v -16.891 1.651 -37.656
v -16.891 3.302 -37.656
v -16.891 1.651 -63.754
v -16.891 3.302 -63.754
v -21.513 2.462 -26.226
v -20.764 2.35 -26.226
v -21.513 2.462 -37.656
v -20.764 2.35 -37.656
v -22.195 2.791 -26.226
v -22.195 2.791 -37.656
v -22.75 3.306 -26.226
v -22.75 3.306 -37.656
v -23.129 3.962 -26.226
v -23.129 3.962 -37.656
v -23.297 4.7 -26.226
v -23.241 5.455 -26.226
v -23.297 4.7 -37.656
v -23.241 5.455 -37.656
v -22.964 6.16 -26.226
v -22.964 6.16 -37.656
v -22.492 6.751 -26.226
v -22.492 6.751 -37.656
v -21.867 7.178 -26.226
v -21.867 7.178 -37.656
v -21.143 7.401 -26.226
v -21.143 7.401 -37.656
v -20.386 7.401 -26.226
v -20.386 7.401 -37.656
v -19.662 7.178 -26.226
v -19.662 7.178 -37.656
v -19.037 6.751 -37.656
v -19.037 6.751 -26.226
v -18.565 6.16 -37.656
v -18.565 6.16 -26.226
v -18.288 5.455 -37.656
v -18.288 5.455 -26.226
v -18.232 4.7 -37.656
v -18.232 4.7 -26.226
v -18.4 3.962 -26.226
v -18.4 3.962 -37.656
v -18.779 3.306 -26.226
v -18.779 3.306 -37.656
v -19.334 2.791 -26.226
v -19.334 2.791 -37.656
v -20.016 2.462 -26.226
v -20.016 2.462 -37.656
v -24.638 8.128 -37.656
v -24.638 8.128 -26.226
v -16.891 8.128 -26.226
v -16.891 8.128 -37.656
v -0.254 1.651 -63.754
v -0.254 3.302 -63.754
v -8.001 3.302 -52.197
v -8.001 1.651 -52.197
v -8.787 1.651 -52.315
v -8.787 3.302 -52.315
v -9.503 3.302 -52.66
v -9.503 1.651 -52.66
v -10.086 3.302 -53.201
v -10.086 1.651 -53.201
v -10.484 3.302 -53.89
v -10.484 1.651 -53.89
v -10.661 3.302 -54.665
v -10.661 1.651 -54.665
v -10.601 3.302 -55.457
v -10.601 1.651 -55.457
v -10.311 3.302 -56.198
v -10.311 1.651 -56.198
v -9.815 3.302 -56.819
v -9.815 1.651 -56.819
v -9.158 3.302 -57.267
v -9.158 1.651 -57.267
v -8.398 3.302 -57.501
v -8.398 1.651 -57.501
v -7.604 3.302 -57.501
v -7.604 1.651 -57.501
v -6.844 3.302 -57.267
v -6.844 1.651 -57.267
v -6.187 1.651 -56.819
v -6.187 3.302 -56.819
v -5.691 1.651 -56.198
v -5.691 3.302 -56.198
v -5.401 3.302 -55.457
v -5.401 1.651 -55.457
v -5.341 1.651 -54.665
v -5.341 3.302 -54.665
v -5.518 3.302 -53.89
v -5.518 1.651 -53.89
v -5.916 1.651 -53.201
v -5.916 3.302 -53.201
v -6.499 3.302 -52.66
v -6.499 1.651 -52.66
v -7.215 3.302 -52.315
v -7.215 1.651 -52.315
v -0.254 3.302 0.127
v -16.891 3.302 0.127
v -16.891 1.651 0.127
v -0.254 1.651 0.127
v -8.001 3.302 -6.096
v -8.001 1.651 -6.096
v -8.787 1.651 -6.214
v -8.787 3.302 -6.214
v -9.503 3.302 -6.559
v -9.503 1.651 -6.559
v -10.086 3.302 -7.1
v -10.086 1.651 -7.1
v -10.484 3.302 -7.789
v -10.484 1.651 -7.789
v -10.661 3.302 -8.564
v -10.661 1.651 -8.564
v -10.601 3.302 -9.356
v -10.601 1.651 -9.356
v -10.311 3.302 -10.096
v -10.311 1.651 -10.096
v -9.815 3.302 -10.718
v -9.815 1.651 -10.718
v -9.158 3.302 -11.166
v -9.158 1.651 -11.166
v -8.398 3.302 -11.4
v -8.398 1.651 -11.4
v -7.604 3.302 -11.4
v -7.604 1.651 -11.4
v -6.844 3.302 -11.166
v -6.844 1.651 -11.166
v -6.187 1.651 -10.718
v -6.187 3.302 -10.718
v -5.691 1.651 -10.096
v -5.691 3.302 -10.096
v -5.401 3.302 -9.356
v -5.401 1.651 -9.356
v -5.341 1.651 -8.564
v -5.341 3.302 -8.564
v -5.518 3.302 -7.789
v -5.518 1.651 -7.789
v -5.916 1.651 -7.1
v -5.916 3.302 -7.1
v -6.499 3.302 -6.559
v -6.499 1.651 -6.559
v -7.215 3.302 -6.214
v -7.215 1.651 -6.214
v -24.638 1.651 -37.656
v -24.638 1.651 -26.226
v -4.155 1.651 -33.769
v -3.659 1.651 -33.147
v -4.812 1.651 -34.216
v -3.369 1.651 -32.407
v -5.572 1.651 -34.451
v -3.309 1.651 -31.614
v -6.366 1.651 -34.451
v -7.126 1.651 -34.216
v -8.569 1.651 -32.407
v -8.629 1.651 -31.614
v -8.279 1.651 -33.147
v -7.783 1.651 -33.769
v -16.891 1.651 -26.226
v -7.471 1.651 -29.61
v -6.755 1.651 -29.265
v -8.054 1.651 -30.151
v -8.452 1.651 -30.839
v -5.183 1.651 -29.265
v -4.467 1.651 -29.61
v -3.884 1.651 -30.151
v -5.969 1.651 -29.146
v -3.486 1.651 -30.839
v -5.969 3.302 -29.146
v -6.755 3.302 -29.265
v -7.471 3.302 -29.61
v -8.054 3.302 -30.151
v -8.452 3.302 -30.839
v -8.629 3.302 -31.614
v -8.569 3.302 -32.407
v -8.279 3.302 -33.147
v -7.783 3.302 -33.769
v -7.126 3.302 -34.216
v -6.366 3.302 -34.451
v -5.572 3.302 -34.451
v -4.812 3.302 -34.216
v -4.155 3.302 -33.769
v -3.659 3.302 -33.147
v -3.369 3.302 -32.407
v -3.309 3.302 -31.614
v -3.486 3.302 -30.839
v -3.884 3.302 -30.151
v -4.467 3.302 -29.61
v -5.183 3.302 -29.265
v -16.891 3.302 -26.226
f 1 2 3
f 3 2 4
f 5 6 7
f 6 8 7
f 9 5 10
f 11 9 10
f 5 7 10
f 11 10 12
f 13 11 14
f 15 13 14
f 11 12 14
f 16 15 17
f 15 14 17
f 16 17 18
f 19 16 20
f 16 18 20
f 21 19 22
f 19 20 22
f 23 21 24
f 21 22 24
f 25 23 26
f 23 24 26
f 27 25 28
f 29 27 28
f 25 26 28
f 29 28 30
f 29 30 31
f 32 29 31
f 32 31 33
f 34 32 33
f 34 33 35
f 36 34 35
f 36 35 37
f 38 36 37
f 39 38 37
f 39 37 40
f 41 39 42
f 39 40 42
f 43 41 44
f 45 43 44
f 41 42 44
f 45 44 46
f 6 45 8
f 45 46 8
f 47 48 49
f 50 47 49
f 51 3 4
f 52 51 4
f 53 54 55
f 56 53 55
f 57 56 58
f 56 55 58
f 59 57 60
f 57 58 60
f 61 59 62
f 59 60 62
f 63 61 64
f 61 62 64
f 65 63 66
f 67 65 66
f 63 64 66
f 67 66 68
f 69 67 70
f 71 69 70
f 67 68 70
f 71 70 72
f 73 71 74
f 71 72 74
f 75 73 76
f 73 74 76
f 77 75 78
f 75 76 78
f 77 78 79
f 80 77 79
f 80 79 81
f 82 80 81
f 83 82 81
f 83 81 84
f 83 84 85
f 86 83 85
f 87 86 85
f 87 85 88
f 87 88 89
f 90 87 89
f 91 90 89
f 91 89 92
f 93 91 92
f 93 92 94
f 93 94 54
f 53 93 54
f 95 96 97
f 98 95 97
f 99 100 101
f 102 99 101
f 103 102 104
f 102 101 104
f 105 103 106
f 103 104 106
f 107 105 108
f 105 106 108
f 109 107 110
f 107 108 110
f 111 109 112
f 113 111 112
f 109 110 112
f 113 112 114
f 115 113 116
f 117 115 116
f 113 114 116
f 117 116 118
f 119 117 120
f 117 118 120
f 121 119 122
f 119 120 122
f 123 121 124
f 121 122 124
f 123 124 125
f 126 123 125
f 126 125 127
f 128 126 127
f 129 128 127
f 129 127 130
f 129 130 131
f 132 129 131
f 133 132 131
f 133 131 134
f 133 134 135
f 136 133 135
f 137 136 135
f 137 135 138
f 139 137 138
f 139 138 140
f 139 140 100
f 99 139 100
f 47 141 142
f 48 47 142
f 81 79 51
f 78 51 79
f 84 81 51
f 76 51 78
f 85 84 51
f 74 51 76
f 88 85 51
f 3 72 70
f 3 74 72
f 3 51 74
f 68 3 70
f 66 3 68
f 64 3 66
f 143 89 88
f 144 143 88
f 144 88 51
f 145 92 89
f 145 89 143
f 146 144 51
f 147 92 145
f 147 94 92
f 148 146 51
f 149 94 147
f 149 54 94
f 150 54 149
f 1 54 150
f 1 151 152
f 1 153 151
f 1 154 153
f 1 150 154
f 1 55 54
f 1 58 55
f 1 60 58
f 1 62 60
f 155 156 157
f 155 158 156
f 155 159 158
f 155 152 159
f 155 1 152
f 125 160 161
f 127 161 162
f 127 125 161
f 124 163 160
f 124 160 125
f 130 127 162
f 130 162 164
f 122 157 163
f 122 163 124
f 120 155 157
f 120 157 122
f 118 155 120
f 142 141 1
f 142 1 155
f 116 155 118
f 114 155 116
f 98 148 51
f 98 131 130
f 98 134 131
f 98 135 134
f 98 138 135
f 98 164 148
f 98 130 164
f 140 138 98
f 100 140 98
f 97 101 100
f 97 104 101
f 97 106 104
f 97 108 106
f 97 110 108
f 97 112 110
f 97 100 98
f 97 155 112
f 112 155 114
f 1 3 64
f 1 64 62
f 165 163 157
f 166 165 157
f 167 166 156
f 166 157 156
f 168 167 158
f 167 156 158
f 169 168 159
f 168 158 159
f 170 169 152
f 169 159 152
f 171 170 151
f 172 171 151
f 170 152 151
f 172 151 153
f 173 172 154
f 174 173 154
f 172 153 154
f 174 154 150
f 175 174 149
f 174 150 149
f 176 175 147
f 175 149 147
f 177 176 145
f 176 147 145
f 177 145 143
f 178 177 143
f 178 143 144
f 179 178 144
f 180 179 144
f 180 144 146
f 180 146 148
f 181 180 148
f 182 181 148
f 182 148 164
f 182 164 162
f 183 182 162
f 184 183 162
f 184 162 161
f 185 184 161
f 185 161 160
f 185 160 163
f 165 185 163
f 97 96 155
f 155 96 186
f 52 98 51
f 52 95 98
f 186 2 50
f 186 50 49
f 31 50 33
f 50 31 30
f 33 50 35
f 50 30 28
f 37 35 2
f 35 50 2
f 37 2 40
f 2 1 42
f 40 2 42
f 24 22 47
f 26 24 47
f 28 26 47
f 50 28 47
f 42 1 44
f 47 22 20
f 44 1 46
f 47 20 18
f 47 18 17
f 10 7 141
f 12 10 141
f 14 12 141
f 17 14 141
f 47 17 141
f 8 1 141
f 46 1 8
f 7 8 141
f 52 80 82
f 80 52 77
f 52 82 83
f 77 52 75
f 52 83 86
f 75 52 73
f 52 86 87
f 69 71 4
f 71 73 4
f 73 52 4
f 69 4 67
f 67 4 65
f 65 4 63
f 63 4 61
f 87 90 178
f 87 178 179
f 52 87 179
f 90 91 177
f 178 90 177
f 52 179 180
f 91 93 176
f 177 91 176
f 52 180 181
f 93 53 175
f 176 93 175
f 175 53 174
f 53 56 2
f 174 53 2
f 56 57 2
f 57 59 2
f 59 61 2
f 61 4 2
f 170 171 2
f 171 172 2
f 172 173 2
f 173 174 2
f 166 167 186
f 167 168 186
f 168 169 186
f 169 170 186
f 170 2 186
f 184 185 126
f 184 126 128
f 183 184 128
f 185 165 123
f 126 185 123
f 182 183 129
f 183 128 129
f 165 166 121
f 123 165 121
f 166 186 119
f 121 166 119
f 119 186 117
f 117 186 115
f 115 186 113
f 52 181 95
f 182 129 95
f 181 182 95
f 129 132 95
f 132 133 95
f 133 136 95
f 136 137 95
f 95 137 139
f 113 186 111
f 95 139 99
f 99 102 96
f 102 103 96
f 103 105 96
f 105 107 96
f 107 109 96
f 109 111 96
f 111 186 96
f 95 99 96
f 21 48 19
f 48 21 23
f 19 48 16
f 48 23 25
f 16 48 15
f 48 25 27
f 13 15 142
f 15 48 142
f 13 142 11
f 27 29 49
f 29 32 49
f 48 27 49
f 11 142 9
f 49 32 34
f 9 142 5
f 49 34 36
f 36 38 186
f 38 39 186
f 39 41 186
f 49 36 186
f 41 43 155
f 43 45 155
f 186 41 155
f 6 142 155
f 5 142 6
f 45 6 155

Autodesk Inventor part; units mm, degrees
ref_plane "YZ Plane" through (0, 0, 0) normal (1, 0, 0) x (0, 1, 0)
ref_plane "XZ Plane" through (0, 0, 0) normal (0, 1, 0) x (-1, 0, 0)
ref_plane "XY Plane" through (0, 0, 0) normal (0, 0, 1) x (1, 0, 0)
sketch "Sketch1" plane through (0, 0, 0) normal (0, 1, 0) x (-1, 0, 0)
  line L0 (0, 0) -> (0, -63.881)
  line L1 (0, -63.881) -> (16.891, -63.881)
  line L2 (16.891, -63.881) -> (16.891, 0)
  line L3 (16.891, 0) -> (0, 0)
  line L4 (16.891, 0) -> (24.638, 0)
  line L5 (24.638, 0) -> (24.638, -11.43)
  line L6 (24.638, -11.43) -> (16.891, -11.43)
  line L7 (16.891, -63.881) -> (24.638, -63.881)
  line L8 (24.638, -63.881) -> (24.638, -52.451)
  line L9 (24.638, -52.451) -> (16.891, -52.451)
  dimension "d0" = 63.881
  dimension "d1" = 16.891
  dimension "d2" = 7.747
  dimension "d3" = 11.43
  dimension "d4" = 7.747
  dimension "d5" = 11.43
extrude "Extrusion1" add sketch "Sketch1" along normal blind 1.651 contours L3 L2 L1 L0
hole "Hole3" at (-5.715, 1.651, -32.131) direction (0, -1, 0) diameter 5.334 end through all
sketch "Sketch2" plane through (0, 1.651, 0) normal (0, 1, 0) x (1, 0, 0)
  line L0 (-16.891, 63.881) -> (-16.891, 31.9405)
  line L1 (-16.891, 63.881) -> (-16.891, 0) projected
  line L2 (-16.891, 31.9405) -> (-16.891, 37.6555)
  line L3 (-16.891, 37.6555) -> (-24.638, 37.6555)
  line L4 (-24.638, 37.6555) -> (-24.638, 26.2255)
  line L5 (-24.638, 26.2255) -> (-16.891, 26.2255)
  line L6 (-16.891, 31.9405) -> (-16.891, 37.6555)
  point P0 (0, 0)
  dimension "d48" = 31.9405
  dimension "d49" = 5.715
  dimension "d50" = 7.747
  dimension "d51" = 11.43
extrude "Extrusion4" add sketch "Sketch2" along normal blind 6.477
hole "Hole5" at (-20.7645, 4.8895, -26.2255) direction (0, 0, -1) diameter 5.08 end through all
sketch "Sketch3" plane through (0, 1.651, 0) normal (0, 1, 0) x (1, 0, 0)
  line L0 (0, 63.881) -> (-16.891, 63.881)
  line L1 (-16.891, 63.881) -> (-16.891, 0)
  line L2 (-16.891, 0) -> (0, 0)
  line L3 (0, 0) -> (0, 63.881)
  line L4 (0, 63.881) -> (-16.891, 63.881) projected
extrude "Extrusion5" cut sketch "Sketch3" against normal blind 6.35
sketch "Sketch4" plane through (-16.891, 1.651, -37.6555) normal (1, 0, 0) x (0, 0, -1)
  line L0 (0, 0) -> (-11.43, 0) projected
  line L1 (-5.715, 0) -> (26.0985, 0)
  line L2 (26.0985, 0) -> (26.0985, 1.651)
  line L3 (26.0985, 0) -> (26.0985, 1.651)
  line L4 (26.0985, 1.651) -> (-37.7825, 1.651)
  line L5 (-37.7825, 1.651) -> (-37.7825, 0)
  line L6 (-37.7825, 0) -> (-11.43, 0)
  point P0 (-37.6555, -1.651)
  dimension "d65" = 31.8135
  dimension "d66" = 1.651
  dimension "d67" = 1.651
  dimension "d68" = 63.881
extrude "Extrusion6" add sketch "Sketch4" along normal blind 16.637
hole "Hole6" at (-8.001, 3.302, -8.763) direction (0, -1, 0) diameter 5.334 end through all
hole "Hole7" at (-8.001, 3.302, -54.864) direction (0, -1, 0) diameter 5.334 end through all
hole "Hole8" at (-5.969, 3.302, -31.8135) direction (0, -1, 0) diameter 5.334 end through all
properties part number "door hinge for conveyor part 2"
